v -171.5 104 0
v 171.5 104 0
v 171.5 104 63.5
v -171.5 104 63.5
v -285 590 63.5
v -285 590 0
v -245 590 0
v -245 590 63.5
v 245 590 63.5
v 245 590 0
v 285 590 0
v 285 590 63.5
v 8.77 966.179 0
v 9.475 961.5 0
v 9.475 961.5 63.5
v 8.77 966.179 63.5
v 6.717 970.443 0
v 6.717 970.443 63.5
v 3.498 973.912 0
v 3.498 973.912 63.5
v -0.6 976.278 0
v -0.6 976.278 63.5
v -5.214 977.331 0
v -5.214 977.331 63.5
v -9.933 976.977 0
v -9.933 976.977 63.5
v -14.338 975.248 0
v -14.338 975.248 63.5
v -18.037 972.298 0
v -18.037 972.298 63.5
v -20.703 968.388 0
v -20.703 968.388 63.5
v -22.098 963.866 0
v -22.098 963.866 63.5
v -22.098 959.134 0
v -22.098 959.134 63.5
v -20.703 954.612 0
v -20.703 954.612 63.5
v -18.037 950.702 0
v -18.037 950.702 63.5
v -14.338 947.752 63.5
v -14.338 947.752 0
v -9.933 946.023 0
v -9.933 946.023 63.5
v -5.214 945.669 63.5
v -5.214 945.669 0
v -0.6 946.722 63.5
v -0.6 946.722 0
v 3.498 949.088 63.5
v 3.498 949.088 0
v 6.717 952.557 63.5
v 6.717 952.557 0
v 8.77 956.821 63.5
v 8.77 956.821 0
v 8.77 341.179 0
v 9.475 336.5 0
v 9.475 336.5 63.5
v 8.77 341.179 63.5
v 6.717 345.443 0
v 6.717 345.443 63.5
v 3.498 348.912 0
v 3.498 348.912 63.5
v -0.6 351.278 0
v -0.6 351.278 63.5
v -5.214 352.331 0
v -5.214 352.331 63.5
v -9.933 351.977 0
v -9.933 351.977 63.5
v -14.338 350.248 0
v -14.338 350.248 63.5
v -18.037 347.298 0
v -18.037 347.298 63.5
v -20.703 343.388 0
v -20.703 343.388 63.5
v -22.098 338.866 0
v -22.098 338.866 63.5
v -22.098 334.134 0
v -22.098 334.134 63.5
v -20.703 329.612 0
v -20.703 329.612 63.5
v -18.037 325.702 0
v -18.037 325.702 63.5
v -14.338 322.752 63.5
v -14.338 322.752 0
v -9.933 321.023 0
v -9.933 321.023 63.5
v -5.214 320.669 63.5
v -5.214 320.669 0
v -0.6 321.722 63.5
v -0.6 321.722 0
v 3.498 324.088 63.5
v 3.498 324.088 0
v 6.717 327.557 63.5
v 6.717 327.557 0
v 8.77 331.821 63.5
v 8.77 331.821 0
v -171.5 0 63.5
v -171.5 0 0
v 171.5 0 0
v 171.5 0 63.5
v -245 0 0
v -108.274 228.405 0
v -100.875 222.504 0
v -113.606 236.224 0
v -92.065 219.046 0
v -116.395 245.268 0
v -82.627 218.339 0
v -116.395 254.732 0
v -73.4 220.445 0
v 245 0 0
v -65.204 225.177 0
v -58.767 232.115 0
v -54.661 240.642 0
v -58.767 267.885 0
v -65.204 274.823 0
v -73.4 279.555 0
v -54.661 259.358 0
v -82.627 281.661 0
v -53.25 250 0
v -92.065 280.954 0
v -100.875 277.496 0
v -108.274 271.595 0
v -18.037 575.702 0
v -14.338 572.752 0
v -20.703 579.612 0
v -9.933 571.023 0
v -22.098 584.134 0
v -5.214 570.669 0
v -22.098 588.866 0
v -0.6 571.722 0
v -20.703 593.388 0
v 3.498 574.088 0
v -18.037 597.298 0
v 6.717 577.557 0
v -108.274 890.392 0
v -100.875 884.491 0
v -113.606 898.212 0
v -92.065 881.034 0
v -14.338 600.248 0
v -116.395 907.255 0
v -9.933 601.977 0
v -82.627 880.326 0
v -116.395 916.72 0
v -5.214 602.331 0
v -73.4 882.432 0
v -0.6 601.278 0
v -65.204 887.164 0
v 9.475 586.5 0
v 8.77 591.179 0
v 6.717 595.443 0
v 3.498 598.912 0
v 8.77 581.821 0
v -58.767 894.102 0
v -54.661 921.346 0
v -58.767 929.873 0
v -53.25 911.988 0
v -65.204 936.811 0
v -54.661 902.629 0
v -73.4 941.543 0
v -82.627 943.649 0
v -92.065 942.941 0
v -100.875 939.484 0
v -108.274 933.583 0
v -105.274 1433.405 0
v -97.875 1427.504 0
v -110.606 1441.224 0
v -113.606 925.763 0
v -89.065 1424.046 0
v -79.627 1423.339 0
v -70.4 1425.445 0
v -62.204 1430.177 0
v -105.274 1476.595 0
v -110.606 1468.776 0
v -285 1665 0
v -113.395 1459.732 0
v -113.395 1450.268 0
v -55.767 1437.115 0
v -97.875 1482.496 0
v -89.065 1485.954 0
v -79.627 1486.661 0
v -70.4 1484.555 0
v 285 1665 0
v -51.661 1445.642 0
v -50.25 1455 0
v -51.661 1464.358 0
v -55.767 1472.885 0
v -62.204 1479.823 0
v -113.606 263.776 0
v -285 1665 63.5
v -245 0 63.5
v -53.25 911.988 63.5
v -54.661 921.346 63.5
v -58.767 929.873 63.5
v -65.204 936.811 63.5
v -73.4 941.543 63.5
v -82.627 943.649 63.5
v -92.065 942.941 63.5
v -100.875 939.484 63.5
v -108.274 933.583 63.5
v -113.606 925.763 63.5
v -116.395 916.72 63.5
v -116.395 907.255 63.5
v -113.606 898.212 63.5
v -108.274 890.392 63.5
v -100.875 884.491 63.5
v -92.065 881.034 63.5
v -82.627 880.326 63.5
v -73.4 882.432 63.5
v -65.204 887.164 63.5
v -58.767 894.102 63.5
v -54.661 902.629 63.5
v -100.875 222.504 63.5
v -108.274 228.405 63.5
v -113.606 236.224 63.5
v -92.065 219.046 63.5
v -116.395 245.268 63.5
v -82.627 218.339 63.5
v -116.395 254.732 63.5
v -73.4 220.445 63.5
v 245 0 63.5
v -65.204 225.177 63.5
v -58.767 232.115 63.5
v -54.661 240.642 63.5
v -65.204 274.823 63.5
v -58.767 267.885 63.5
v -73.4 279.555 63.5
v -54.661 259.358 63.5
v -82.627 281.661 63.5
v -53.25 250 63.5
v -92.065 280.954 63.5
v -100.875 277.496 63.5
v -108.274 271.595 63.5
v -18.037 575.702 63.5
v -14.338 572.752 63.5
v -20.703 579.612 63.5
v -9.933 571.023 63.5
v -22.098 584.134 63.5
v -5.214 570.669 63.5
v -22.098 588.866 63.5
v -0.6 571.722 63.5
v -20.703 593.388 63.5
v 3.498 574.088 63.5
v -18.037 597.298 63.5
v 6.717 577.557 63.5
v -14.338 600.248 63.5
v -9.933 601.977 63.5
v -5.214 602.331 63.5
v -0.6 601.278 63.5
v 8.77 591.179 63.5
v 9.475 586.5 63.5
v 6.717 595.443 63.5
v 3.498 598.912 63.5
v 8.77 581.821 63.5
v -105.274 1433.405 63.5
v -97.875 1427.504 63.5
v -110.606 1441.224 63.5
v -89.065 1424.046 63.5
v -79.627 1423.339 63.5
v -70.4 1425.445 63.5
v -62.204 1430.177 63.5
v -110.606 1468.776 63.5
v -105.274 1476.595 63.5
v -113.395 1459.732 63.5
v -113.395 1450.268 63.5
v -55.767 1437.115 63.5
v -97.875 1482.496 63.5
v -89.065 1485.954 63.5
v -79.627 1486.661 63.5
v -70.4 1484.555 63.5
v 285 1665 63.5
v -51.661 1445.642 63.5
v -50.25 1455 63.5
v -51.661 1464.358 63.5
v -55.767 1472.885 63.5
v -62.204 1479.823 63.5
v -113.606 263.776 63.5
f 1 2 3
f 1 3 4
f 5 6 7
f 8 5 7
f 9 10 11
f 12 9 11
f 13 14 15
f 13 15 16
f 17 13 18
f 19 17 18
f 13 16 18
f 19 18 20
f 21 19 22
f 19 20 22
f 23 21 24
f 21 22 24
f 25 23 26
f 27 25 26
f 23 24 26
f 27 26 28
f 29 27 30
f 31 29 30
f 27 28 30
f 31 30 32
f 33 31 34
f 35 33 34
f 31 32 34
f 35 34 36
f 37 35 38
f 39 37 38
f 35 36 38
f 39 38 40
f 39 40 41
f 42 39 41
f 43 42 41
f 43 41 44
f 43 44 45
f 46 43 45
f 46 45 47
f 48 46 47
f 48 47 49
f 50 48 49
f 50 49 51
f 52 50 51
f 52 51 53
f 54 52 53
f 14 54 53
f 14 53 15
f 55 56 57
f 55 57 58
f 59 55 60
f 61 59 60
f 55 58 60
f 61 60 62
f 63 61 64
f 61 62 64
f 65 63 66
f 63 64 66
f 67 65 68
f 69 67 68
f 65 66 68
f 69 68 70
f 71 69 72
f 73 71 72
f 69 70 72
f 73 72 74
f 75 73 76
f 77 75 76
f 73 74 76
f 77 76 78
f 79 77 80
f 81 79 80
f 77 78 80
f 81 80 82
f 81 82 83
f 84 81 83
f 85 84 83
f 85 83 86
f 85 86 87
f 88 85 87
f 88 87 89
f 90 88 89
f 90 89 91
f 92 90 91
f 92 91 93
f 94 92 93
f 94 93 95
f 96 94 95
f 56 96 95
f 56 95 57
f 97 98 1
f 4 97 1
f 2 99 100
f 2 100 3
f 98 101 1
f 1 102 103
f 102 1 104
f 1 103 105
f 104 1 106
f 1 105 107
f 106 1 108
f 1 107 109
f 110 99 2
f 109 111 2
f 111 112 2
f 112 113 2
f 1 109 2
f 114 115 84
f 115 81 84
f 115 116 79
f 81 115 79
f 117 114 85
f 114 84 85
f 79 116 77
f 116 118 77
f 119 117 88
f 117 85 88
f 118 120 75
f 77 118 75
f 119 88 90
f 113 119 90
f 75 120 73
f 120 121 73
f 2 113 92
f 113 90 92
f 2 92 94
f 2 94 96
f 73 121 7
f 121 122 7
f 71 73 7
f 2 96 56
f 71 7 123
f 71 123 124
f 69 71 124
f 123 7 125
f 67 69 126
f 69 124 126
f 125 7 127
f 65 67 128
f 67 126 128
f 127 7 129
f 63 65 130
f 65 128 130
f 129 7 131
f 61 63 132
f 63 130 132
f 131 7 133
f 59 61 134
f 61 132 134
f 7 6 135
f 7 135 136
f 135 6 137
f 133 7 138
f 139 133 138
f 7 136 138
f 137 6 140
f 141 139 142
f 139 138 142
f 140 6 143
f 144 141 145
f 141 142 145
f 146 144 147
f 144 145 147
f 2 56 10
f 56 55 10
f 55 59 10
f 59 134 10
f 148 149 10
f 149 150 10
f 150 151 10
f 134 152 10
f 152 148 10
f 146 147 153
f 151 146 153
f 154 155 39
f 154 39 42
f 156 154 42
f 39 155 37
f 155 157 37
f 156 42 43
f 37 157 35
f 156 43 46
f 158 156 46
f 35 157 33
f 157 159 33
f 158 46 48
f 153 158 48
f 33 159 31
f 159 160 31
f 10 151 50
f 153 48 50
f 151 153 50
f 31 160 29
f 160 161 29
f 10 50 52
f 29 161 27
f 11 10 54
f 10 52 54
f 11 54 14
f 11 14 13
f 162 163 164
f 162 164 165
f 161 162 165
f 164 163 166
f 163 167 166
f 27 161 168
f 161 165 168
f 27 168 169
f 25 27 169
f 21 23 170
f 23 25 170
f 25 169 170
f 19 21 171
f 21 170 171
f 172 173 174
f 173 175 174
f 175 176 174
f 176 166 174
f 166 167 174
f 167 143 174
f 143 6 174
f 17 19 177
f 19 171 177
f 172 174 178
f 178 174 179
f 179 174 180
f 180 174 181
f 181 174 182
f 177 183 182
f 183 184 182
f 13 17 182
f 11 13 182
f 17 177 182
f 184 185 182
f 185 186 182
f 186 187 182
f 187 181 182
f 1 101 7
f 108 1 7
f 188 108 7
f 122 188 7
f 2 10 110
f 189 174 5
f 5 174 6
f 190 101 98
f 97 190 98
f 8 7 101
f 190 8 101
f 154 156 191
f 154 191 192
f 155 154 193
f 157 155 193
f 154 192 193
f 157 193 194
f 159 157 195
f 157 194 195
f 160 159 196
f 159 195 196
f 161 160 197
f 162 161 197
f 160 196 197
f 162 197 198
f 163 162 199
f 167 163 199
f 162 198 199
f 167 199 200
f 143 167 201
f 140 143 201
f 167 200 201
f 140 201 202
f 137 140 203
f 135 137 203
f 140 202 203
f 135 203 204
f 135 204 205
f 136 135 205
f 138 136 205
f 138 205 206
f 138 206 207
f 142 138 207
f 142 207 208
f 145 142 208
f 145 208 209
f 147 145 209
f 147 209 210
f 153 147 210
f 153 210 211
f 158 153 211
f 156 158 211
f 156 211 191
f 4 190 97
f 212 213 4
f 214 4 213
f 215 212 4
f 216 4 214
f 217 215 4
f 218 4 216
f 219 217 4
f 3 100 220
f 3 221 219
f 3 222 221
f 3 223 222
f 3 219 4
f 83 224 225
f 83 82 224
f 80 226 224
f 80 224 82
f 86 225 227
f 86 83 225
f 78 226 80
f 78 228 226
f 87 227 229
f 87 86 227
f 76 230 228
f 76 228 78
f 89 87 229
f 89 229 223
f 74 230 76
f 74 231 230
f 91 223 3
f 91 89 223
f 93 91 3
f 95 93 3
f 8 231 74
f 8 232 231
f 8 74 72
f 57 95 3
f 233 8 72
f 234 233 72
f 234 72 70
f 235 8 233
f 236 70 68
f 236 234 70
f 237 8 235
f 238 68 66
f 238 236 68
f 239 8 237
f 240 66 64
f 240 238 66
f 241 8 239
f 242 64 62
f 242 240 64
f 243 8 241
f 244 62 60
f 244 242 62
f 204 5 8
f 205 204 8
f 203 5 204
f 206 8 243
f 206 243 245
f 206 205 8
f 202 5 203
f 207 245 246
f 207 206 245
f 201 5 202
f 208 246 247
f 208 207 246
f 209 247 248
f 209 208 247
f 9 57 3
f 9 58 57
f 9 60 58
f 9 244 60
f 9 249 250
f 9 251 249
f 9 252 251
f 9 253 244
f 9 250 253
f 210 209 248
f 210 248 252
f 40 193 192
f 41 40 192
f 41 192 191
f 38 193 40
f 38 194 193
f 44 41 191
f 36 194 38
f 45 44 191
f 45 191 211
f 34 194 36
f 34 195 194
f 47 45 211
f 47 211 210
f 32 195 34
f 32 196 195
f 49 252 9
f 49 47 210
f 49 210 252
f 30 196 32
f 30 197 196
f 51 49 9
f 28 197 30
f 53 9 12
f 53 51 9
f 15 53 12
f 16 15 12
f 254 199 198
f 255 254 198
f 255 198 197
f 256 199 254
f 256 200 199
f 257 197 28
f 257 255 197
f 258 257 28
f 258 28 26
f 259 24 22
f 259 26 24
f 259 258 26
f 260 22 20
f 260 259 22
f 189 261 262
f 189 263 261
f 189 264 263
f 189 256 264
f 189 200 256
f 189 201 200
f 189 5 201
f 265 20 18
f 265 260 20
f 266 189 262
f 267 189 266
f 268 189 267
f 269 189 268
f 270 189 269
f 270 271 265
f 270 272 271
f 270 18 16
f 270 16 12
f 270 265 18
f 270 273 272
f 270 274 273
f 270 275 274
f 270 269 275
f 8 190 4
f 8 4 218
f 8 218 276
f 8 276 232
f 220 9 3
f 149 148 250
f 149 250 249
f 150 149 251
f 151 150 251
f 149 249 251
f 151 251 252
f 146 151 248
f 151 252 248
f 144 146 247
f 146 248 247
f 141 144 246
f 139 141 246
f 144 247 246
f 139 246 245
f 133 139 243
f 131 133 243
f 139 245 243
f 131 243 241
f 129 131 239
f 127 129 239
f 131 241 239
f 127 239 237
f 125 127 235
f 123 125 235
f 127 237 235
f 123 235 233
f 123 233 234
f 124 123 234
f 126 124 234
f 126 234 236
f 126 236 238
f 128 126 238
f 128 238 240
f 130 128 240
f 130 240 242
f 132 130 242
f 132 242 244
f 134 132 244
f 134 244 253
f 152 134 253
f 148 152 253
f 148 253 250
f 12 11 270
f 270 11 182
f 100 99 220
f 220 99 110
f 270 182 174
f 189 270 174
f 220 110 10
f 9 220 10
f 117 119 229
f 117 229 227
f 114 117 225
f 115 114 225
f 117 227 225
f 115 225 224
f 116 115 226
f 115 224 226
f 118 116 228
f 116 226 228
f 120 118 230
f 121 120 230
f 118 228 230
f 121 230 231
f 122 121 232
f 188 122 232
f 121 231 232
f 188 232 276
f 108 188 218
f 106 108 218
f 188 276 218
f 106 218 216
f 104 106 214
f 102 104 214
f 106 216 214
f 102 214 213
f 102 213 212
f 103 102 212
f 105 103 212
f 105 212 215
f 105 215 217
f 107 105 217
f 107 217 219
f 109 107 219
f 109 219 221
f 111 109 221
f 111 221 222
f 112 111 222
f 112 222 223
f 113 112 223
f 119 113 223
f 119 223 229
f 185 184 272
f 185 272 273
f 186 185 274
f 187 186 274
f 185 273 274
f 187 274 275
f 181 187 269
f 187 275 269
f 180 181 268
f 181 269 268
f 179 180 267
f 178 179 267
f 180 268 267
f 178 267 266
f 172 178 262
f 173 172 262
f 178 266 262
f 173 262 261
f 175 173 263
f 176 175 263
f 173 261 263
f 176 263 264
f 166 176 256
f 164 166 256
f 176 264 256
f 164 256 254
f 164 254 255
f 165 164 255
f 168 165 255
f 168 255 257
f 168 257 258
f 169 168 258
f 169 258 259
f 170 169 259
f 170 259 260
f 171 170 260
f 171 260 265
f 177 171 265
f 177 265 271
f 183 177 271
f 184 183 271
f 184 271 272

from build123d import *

# Parameters (mm, degrees)
BOSS_EXTRUDE1_DEPTH = 63.5
SKETCH2_W           = 343
SKETCH2_H           = 104
CUT_EXTRUDE1_DEPTH  = 1691.408900237
SKETCH3_R           = 31.75
CUT_EXTRUDE2_DEPTH  = 1691.408900237
SKETCH4_R           = 31.75
CUT_EXTRUDE3_DEPTH  = 1691.408900237
SKETCH5_R           = 15.875
CUT_EXTRUDE4_DEPTH  = 1691.408900237


with BuildPart() as part:
    # Sketch1 → Boss-Extrude1 (new body)
    with BuildSketch(Plane.XY):
        Polygon((-245, 0), (245, 0), (245, 590), (285, 590), (285, 1665), (-285, 1665), (-285, 590), (-245, 590), align=None)
    extrude(amount=BOSS_EXTRUDE1_DEPTH)

    # Sketch2 → Cut-Extrude1 (cut, through all)
    with BuildSketch(Plane(origin=(0, 0, 0), x_dir=(-1, 0, 0), z_dir=(0, 0, -1))):
        with Locations((0, 52)):
            Rectangle(SKETCH2_W, SKETCH2_H)
    extrude(amount=-CUT_EXTRUDE1_DEPTH, mode=Mode.SUBTRACT)

    # Sketch3 → Cut-Extrude2 (cut, through all)
    with BuildSketch(Plane.XY.offset(63.5)):
        with Locations((-82, 1455)):
            Circle(SKETCH3_R)
    extrude(amount=-CUT_EXTRUDE2_DEPTH, mode=Mode.SUBTRACT)

    # Sketch4 → Cut-Extrude3 (cut, through all)
    with BuildSketch(Plane.XY.offset(63.5)):
        with Locations((-85, 250)):
            Circle(SKETCH4_R)
        with Locations((-85, 911.9875)):
            Circle(SKETCH4_R)
    extrude(amount=-CUT_EXTRUDE3_DEPTH, mode=Mode.SUBTRACT)

    # Sketch5 → Cut-Extrude4 (cut, through all)
    with BuildSketch(Plane.XY.offset(63.5)):
        with Locations((-6.4, 336.5)):
            Circle(SKETCH5_R)
        with Locations((-6.4, 586.5)):
            Circle(SKETCH5_R)
        with Locations((-6.4, 961.5)):
            Circle(SKETCH5_R)
    extrude(amount=-CUT_EXTRUDE4_DEPTH, mode=Mode.SUBTRACT)


solid = part.part
